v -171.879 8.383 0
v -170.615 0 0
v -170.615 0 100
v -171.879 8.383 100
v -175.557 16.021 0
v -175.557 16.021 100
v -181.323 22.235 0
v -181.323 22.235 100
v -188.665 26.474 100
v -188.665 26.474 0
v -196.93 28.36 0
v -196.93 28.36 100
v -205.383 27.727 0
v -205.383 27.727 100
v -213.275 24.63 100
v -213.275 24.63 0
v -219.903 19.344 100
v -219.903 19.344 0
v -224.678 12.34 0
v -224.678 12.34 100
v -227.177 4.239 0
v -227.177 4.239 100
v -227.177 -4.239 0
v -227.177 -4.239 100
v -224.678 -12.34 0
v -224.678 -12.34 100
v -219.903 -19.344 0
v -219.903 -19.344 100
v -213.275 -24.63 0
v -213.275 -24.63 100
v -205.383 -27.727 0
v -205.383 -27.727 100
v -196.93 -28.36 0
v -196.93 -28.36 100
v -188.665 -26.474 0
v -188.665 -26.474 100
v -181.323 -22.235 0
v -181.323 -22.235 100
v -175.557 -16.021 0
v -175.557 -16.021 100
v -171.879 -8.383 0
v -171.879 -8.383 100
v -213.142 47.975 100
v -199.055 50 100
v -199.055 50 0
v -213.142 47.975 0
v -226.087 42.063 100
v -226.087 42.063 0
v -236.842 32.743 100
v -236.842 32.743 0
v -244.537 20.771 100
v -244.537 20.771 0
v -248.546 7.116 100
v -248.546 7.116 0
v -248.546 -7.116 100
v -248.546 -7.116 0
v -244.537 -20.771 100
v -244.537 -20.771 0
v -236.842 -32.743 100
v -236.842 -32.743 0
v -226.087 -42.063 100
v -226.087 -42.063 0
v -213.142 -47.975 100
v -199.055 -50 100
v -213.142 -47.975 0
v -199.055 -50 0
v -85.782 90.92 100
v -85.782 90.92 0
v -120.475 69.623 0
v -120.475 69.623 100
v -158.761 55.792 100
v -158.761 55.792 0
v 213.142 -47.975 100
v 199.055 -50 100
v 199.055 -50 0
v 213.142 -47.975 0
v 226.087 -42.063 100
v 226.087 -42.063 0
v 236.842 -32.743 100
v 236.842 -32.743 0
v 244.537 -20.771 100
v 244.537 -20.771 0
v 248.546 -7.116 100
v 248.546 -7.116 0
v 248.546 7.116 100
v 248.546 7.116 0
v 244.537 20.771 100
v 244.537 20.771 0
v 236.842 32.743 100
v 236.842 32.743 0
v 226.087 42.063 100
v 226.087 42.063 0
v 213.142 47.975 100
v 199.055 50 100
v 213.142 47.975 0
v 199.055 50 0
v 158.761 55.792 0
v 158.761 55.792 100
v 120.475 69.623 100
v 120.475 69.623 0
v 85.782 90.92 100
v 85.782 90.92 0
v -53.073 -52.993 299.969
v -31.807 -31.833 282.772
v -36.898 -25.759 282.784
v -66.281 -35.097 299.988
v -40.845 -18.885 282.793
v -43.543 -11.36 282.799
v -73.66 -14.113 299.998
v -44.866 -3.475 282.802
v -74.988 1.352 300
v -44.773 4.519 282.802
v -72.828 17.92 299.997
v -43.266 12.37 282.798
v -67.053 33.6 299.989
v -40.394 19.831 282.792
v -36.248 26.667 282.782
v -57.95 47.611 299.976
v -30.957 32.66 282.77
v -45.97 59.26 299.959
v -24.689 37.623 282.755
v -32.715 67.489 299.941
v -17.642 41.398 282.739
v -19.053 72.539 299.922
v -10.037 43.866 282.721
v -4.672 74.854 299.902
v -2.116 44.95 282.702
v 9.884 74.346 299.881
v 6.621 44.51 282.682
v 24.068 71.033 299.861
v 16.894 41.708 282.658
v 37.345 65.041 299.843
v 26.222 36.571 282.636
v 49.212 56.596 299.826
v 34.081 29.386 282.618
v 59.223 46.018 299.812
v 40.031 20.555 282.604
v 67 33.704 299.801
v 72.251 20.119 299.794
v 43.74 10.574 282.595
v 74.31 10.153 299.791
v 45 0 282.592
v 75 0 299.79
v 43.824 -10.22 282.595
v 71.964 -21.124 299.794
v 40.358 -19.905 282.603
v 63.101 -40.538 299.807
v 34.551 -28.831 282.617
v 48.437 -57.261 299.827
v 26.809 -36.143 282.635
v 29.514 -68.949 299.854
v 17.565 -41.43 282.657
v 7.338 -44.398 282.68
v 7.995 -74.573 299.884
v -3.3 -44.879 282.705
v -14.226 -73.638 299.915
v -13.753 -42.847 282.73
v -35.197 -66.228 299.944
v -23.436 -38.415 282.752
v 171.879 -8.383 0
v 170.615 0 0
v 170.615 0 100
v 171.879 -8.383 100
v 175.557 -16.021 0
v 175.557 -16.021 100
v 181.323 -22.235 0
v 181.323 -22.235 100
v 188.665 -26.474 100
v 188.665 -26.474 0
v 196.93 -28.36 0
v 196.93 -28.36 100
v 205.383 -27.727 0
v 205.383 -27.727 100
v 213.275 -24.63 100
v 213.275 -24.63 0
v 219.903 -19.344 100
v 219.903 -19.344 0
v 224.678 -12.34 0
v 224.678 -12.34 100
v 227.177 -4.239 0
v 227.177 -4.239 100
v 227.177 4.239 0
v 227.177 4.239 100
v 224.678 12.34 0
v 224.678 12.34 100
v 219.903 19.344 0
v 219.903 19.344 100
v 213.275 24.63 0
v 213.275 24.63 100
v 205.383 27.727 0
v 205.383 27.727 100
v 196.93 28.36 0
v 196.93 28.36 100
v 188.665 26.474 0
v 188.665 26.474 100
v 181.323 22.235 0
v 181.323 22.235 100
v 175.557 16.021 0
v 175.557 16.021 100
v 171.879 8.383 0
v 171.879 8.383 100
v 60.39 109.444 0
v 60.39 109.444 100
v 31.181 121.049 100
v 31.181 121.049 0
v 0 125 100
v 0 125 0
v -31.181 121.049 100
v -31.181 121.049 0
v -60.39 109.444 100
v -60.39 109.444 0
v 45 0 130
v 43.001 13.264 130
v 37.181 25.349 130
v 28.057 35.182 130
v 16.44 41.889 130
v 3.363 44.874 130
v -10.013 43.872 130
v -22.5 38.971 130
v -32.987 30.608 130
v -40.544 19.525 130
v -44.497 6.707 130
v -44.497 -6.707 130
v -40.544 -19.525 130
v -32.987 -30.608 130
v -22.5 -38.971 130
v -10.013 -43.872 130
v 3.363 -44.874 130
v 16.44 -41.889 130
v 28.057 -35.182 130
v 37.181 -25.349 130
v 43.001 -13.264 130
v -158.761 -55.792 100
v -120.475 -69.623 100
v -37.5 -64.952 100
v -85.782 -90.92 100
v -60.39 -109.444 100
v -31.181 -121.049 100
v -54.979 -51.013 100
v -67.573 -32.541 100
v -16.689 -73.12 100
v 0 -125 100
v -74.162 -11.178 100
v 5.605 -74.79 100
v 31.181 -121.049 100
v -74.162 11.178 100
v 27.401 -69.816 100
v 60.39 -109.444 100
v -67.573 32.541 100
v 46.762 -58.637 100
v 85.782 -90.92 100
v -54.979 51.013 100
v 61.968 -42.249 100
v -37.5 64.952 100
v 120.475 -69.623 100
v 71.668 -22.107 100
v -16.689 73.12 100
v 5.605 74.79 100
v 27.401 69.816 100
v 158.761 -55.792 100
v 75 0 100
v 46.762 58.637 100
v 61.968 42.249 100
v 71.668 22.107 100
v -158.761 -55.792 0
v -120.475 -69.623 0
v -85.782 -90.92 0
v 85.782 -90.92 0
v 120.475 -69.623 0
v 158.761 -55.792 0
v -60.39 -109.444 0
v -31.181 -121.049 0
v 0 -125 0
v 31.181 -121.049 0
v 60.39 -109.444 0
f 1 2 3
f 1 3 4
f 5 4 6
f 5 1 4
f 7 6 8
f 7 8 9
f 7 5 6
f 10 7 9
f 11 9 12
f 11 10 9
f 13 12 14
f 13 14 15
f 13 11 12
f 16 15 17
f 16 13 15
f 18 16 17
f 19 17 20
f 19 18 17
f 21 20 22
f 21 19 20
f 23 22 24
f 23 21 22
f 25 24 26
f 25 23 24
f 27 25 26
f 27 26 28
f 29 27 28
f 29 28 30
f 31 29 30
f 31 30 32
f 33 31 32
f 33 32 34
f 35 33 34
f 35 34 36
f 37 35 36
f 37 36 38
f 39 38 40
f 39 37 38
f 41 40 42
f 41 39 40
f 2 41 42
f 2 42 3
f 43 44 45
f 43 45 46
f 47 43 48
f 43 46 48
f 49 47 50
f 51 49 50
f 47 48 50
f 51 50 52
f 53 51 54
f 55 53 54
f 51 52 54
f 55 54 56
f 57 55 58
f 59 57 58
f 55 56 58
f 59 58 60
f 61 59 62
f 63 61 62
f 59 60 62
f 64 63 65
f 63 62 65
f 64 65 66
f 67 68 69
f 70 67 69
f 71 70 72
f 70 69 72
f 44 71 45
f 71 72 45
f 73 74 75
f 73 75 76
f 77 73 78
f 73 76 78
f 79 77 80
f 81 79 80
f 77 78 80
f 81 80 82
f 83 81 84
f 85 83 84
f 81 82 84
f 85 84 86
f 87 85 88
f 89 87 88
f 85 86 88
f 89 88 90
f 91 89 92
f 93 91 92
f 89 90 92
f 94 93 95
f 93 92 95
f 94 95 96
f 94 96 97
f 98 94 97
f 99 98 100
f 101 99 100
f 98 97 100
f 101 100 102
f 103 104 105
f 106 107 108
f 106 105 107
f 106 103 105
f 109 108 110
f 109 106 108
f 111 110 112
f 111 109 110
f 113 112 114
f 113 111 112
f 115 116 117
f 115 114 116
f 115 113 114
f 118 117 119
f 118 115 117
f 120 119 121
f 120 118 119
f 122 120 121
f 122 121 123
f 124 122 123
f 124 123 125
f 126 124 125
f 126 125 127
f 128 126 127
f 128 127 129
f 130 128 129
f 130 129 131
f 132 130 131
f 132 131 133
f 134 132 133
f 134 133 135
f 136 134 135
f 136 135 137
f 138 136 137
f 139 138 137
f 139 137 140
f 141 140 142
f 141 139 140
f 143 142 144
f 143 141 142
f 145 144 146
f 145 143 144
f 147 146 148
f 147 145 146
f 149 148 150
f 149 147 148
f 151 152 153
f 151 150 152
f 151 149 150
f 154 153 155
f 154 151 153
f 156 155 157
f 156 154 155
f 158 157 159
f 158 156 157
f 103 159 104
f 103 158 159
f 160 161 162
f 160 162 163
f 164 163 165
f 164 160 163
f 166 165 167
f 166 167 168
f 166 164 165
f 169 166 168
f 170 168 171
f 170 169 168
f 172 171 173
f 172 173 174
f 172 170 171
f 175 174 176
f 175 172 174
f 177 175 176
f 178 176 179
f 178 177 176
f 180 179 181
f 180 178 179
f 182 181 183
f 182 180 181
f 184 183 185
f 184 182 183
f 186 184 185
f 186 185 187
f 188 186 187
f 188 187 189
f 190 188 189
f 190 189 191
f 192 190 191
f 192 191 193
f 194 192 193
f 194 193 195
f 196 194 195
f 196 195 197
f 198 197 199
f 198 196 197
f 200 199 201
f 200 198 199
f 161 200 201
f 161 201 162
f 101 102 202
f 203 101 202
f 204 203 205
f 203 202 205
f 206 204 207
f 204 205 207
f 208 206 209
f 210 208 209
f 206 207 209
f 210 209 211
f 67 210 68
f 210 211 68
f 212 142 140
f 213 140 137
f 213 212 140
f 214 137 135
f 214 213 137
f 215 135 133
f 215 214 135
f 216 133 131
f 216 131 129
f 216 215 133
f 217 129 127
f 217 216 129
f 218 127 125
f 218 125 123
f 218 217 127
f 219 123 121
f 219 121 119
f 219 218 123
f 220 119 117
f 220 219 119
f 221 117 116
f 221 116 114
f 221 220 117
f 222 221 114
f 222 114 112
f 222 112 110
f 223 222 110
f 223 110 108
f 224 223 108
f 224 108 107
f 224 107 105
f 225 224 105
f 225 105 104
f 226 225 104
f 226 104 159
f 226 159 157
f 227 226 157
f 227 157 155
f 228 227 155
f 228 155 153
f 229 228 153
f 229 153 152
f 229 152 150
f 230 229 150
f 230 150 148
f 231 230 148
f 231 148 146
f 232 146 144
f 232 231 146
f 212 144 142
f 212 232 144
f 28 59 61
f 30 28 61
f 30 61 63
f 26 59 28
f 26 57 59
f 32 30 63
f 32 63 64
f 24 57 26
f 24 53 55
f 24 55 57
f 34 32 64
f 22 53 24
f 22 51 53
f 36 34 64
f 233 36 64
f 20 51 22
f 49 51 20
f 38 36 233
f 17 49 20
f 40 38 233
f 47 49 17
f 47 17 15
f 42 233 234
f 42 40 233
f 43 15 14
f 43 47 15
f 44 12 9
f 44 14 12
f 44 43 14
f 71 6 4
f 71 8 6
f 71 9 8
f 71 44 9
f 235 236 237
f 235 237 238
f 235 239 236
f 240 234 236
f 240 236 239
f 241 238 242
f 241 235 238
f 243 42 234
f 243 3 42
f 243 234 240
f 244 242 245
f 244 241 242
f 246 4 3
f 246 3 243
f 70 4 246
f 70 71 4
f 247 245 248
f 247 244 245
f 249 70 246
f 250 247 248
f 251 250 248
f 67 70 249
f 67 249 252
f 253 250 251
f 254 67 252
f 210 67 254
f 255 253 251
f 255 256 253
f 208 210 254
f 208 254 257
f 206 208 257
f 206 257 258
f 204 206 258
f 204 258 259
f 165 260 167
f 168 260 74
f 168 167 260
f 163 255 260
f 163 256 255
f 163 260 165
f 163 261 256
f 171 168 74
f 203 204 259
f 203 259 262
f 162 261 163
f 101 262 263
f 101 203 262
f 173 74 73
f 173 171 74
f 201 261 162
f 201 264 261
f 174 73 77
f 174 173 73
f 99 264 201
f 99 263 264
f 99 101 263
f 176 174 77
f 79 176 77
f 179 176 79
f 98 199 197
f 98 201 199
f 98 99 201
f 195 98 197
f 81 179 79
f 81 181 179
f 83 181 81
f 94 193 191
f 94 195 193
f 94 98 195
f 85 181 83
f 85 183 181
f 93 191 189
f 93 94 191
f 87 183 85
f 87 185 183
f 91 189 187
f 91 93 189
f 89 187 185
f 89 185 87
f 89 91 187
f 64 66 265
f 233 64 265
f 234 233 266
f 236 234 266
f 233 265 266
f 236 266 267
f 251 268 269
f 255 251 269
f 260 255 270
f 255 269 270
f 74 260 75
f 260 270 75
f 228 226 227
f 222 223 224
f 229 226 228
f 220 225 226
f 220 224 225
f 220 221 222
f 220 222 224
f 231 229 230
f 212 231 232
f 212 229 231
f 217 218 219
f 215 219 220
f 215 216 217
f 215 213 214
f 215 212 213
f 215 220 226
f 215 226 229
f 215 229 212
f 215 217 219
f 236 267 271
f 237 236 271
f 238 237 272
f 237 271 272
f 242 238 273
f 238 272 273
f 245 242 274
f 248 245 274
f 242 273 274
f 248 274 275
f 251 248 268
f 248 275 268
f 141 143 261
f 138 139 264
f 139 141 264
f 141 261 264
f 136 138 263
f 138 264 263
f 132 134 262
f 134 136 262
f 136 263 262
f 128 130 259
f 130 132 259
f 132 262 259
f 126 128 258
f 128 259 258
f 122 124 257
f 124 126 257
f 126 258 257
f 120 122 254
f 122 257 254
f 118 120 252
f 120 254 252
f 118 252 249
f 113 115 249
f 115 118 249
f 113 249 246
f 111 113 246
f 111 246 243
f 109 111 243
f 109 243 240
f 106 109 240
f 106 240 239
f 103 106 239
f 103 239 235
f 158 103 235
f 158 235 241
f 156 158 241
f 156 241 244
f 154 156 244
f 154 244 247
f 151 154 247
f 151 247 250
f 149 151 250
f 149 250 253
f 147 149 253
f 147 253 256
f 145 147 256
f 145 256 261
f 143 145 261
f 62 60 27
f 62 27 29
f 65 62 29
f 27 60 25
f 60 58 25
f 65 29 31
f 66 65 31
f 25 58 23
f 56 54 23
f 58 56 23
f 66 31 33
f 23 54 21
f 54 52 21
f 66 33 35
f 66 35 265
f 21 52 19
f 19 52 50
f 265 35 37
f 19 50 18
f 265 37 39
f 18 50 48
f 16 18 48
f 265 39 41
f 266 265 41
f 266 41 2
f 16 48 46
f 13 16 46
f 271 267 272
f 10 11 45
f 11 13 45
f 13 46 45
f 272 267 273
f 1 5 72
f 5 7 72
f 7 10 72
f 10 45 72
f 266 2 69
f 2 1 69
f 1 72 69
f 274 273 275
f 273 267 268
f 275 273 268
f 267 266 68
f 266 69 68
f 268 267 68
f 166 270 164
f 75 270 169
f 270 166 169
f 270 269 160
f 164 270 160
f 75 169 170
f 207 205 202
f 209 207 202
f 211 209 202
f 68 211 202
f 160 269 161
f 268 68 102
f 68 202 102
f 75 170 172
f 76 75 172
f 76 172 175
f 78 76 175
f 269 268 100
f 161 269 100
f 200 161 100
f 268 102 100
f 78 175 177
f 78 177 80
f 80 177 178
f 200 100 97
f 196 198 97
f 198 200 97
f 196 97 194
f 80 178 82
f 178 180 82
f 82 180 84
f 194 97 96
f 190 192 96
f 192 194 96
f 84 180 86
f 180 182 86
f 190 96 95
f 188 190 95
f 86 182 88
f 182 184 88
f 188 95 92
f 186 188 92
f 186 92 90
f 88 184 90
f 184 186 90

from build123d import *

# Parameters (mm, degrees)
SKETCH1_R           = 28.439830306
BOSS_EXTRUDE1_DEPTH = 100
SKETCH2_R           = 75
BOSS_EXTRUDE2_DEPTH = 200
SHELL2_T            = -30


with BuildPart() as part:
    # Sketch1 → Boss-Extrude1 (new body)
    with BuildSketch(Plane.XY):
        with BuildLine():
            ThreePointArc((-85.781855353, -90.920147889), (0, -125), (85.781855353, -90.920147889))
            ThreePointArc((85.781855353, -90.920147889), (139.265031386, -61.731062237), (199.054955441, -50))
            ThreePointArc((199.054955441, -50), (249.054955441, 0), (199.054955441, 50))
            ThreePointArc((199.054955441, 50), (139.265031386, 61.731062237), (85.781855353, 90.920147889))
            ThreePointArc((85.781855353, 90.920147889), (0, 125), (-85.781855353, 90.920147889))
            ThreePointArc((-85.781855353, 90.920147889), (-139.265031386, 61.731062237), (-199.054955441, 50))
            ThreePointArc((-199.054955441, 50), (-249.054955441, 0), (-199.054955441, -50))
            ThreePointArc((-199.054955441, -50), (-139.265031386, -61.731062237), (-85.781855353, -90.920147889))
        make_face()
        with Locations((-199.054955441, 0)):
            Circle(SKETCH1_R, mode=Mode.SUBTRACT)
        with Locations((199.054955441, 0)):
            Circle(SKETCH1_R, mode=Mode.SUBTRACT)
    extrude(amount=BOSS_EXTRUDE1_DEPTH)


with BuildPart() as body_2:
    # Sketch2 → Boss-Extrude2 (new body)
    with BuildSketch(Plane.XY.offset(100)):
        Circle(SKETCH2_R)
    extrude(amount=BOSS_EXTRUDE2_DEPTH)

    # Shell2
    shell2_openings = [body_2.faces().sort_by_distance(p)[0] for p in [
        (0, 0, 300),
    ]]
    offset(amount=SHELL2_T, openings=shell2_openings, kind=Kind.INTERSECTION)

    # Combine1: union part
    add(part.part)

    # Sketch4 → Cut-Revolve1 (revolve, cut)
    with BuildSketch(Plane(origin=(0, 0, 0), x_dir=(1, 0, 0), z_dir=(0, 1, 0))):
        Polygon((0.183143778, -256.900843522), (-75, -300), (0.183143778, -300), align=None)
    revolve(axis=Axis((0.183143778, 0, 300), (0, 0, -1)), mode=Mode.SUBTRACT)


solid = body_2.part
